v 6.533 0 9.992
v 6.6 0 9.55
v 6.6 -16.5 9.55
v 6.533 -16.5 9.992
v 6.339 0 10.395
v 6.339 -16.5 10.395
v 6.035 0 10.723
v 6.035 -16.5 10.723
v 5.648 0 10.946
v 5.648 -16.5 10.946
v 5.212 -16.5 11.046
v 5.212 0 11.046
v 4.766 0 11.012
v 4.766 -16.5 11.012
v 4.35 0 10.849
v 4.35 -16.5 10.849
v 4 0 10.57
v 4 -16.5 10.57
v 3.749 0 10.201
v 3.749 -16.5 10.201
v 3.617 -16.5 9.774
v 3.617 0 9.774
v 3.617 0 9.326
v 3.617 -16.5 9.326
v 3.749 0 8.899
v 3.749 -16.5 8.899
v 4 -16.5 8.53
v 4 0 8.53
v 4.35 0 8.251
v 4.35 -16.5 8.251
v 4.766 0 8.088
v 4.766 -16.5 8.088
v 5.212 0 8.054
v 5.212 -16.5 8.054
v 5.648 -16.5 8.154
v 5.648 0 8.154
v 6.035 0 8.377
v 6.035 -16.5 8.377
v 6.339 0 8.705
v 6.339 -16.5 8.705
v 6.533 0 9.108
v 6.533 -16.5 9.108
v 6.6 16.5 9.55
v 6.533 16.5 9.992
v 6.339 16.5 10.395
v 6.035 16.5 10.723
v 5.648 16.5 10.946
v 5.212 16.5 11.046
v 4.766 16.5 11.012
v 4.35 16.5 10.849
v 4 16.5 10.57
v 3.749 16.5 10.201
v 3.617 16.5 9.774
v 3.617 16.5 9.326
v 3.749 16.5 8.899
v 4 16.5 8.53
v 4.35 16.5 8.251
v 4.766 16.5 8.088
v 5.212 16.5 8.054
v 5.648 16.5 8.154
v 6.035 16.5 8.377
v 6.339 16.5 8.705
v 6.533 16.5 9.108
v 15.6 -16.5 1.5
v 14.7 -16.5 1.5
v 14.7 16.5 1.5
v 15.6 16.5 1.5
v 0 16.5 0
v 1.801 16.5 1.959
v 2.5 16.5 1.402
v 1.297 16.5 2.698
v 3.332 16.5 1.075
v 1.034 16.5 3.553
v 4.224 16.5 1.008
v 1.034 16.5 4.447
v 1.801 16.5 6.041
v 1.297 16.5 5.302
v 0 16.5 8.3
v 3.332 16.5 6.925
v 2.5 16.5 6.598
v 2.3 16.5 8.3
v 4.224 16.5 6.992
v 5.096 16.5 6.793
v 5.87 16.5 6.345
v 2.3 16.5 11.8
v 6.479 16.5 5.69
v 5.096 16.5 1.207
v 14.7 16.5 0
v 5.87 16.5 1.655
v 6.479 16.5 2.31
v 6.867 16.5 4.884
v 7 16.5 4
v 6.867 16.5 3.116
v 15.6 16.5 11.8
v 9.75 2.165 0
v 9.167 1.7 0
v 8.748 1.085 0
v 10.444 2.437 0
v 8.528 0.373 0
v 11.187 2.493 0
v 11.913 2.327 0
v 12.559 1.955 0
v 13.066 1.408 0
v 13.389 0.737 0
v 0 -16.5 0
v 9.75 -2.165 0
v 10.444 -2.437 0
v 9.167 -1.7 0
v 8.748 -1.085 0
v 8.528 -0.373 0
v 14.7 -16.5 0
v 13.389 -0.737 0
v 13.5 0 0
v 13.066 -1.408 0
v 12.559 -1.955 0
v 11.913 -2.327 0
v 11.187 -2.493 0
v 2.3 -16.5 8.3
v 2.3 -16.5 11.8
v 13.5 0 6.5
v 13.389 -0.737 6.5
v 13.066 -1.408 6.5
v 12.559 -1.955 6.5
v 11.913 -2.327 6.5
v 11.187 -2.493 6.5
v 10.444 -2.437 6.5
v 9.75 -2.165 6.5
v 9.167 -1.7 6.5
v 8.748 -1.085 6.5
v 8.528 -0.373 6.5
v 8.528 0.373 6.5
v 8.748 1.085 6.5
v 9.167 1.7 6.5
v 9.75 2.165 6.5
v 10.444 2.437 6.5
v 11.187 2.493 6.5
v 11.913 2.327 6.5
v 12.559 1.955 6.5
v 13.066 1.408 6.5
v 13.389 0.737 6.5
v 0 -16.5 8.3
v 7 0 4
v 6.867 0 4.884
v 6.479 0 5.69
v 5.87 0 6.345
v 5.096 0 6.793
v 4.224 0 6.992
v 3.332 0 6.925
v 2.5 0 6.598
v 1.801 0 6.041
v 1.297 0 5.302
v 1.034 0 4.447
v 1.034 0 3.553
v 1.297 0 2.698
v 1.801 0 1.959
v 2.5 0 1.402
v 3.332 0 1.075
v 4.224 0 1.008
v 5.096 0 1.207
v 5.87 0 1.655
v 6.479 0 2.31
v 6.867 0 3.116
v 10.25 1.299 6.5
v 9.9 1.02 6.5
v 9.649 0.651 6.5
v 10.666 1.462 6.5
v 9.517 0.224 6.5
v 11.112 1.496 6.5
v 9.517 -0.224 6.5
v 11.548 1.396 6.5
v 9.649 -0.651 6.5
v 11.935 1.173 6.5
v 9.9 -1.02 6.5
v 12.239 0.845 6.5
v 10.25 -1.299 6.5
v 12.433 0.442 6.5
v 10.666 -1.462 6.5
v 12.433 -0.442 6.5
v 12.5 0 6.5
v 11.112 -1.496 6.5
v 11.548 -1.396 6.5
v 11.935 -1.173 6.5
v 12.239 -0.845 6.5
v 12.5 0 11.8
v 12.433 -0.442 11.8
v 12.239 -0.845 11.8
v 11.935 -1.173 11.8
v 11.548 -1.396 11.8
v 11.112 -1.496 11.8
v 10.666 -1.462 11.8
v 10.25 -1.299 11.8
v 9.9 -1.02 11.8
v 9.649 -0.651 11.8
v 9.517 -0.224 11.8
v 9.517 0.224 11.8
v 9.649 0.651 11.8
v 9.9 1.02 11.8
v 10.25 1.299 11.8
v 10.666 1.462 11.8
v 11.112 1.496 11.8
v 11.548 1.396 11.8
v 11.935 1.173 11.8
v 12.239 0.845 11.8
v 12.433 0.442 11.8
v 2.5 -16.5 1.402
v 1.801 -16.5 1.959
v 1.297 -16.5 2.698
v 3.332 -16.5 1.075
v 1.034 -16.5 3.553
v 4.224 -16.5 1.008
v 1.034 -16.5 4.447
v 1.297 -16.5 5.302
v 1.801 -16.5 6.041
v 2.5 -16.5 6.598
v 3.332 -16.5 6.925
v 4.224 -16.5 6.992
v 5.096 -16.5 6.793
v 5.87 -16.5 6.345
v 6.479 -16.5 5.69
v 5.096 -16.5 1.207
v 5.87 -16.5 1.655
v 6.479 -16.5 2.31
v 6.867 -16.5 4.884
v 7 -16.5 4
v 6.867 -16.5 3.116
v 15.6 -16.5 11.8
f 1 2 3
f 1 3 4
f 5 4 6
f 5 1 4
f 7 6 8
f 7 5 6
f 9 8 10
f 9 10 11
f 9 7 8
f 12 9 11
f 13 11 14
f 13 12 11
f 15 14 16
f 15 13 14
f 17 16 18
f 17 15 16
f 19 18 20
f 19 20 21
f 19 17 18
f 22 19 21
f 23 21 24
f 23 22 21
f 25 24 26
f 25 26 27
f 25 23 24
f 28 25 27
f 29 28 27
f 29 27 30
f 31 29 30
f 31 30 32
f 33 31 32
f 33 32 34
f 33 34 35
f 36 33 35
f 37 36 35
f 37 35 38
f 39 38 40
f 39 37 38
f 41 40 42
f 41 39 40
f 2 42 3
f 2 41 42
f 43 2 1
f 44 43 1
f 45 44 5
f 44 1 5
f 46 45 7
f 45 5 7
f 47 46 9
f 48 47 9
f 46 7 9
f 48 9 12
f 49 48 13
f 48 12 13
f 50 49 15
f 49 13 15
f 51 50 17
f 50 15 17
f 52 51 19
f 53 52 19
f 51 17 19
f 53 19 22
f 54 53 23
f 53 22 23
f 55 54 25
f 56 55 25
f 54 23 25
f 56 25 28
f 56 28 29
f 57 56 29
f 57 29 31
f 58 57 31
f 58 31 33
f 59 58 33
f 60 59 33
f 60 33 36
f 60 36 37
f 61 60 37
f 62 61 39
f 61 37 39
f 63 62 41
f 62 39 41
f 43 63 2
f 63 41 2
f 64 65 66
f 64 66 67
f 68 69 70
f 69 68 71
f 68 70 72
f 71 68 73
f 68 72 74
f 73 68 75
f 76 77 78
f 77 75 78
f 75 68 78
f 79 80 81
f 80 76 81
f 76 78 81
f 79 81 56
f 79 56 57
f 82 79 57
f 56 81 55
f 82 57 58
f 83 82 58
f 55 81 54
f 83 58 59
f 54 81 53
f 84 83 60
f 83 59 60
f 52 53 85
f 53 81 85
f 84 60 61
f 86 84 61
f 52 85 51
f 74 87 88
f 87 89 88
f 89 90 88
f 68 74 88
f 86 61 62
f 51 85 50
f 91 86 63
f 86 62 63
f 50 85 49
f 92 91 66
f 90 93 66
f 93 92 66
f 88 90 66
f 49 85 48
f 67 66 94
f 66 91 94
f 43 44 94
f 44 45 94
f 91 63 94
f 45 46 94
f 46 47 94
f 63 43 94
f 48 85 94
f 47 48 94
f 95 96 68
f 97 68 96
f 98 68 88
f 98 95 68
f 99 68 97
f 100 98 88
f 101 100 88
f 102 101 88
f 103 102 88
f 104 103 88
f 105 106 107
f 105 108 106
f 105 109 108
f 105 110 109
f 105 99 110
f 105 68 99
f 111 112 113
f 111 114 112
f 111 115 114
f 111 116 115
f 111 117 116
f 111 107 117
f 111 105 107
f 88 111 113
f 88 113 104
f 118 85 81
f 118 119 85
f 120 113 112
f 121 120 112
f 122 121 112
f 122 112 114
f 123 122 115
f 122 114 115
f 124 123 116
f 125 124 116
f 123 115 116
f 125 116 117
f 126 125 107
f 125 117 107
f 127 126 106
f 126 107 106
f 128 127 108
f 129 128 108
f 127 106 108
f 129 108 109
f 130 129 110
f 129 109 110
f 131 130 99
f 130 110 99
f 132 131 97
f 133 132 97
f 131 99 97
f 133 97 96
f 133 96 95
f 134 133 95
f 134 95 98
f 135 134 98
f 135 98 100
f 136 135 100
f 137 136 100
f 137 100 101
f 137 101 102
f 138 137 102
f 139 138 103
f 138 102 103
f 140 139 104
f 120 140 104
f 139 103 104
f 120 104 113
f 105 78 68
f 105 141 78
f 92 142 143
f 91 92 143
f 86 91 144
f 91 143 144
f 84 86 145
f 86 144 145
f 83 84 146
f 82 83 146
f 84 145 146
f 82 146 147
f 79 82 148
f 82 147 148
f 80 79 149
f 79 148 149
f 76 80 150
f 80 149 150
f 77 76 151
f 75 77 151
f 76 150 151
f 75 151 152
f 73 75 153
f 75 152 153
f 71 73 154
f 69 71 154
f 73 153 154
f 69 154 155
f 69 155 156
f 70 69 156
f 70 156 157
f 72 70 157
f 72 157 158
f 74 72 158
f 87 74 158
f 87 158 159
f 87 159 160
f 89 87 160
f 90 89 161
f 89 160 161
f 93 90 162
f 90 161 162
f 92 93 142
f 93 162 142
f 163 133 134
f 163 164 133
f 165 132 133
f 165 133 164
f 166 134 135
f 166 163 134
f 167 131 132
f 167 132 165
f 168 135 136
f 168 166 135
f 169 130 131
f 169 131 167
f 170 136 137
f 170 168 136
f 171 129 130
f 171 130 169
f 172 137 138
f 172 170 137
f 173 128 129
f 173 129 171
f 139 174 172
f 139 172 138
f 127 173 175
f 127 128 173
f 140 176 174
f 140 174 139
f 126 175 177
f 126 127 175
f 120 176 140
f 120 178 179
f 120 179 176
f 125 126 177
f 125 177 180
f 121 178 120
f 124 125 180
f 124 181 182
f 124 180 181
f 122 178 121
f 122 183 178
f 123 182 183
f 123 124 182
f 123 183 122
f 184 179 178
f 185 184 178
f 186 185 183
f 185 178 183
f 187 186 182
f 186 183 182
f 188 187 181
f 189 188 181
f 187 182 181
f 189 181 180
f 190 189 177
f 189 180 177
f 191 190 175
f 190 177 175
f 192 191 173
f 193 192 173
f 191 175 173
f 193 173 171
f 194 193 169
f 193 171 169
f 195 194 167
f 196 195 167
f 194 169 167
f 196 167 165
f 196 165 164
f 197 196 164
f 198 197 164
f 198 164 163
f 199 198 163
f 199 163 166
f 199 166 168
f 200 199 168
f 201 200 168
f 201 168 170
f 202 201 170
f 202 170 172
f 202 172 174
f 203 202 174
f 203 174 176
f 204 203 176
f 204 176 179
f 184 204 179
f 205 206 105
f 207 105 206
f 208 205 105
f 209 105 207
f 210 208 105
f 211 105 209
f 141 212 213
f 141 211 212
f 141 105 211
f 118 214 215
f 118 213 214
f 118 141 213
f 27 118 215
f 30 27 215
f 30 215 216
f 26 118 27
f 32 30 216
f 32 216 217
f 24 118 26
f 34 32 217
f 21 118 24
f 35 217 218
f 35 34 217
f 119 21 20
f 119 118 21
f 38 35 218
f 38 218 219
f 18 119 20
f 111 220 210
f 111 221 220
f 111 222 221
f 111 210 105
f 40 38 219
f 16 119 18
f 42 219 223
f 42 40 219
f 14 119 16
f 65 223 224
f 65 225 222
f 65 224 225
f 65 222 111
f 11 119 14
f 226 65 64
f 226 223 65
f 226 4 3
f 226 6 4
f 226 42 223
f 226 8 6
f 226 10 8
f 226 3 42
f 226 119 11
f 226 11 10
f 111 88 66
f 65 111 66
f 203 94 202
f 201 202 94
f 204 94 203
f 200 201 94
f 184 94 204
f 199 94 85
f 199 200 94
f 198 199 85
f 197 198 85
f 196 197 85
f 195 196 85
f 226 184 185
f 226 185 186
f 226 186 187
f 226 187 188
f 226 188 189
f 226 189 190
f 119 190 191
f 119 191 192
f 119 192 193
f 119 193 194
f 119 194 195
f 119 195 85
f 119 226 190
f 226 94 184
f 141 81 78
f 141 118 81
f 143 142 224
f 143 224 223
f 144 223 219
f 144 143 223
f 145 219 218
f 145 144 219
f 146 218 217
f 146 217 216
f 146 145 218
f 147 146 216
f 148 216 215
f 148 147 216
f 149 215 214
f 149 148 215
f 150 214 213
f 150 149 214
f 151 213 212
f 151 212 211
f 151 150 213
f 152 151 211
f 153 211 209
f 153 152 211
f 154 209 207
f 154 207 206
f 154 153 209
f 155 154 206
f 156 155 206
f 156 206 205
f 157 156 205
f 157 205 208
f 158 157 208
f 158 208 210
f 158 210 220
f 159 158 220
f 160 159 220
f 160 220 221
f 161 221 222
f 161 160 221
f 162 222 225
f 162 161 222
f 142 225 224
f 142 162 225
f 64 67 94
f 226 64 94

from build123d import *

# Parameters (mm, degrees)
F0_R          = 3
F0_R_2        = 1.5
F1_DEPTH      = 16.5
F1_DEPTH_BACK = 16.5
F2_R          = 1.5
F2_R_2        = 2.5
F3_DEPTH      = 6.5
F4_DEPTH      = 11.8


with BuildPart() as f1:
    # F0 (on Front) → F1 (new body, two sides)
    with BuildSketch(Plane.XZ) as f1_sk:
        Polygon((0, 8.3), (0, 0), (14.7, 0), (14.7, 1.5), (15.6, 1.5), (15.6, 11.8), (2.3, 11.8), (2.3, 8.3), align=None)
        with Locations((4, 4)):
            Circle(F0_R, mode=Mode.SUBTRACT)
        with Locations((5.1, 9.55)):
            Circle(F0_R_2, mode=Mode.SUBTRACT)
    extrude(amount=F1_DEPTH)
    extrude(f1_sk.sketch, amount=-F1_DEPTH_BACK)

    # F2 (on face) → F3 (cut)
    with BuildSketch(Plane(origin=(0, 0, 0), x_dir=(1, 0, 0), z_dir=(0, 0, -1))):
        with Locations((11, 0)):
            Circle(F2_R)
        with Locations((11, 0)):
            Circle(F2_R_2)
        with Locations((11, 0)):
            Circle(F2_R, mode=Mode.SUBTRACT)
    extrude(amount=-F3_DEPTH, mode=Mode.SUBTRACT)

    # F2 (on face) → F4 (cut, through all)
    with BuildSketch(Plane(origin=(0, 0, 0), x_dir=(1, 0, 0), z_dir=(0, 0, -1))):
        with Locations((11, 0)):
            Circle(F2_R)
    extrude(amount=-F4_DEPTH, mode=Mode.SUBTRACT)


solid = f1.part
